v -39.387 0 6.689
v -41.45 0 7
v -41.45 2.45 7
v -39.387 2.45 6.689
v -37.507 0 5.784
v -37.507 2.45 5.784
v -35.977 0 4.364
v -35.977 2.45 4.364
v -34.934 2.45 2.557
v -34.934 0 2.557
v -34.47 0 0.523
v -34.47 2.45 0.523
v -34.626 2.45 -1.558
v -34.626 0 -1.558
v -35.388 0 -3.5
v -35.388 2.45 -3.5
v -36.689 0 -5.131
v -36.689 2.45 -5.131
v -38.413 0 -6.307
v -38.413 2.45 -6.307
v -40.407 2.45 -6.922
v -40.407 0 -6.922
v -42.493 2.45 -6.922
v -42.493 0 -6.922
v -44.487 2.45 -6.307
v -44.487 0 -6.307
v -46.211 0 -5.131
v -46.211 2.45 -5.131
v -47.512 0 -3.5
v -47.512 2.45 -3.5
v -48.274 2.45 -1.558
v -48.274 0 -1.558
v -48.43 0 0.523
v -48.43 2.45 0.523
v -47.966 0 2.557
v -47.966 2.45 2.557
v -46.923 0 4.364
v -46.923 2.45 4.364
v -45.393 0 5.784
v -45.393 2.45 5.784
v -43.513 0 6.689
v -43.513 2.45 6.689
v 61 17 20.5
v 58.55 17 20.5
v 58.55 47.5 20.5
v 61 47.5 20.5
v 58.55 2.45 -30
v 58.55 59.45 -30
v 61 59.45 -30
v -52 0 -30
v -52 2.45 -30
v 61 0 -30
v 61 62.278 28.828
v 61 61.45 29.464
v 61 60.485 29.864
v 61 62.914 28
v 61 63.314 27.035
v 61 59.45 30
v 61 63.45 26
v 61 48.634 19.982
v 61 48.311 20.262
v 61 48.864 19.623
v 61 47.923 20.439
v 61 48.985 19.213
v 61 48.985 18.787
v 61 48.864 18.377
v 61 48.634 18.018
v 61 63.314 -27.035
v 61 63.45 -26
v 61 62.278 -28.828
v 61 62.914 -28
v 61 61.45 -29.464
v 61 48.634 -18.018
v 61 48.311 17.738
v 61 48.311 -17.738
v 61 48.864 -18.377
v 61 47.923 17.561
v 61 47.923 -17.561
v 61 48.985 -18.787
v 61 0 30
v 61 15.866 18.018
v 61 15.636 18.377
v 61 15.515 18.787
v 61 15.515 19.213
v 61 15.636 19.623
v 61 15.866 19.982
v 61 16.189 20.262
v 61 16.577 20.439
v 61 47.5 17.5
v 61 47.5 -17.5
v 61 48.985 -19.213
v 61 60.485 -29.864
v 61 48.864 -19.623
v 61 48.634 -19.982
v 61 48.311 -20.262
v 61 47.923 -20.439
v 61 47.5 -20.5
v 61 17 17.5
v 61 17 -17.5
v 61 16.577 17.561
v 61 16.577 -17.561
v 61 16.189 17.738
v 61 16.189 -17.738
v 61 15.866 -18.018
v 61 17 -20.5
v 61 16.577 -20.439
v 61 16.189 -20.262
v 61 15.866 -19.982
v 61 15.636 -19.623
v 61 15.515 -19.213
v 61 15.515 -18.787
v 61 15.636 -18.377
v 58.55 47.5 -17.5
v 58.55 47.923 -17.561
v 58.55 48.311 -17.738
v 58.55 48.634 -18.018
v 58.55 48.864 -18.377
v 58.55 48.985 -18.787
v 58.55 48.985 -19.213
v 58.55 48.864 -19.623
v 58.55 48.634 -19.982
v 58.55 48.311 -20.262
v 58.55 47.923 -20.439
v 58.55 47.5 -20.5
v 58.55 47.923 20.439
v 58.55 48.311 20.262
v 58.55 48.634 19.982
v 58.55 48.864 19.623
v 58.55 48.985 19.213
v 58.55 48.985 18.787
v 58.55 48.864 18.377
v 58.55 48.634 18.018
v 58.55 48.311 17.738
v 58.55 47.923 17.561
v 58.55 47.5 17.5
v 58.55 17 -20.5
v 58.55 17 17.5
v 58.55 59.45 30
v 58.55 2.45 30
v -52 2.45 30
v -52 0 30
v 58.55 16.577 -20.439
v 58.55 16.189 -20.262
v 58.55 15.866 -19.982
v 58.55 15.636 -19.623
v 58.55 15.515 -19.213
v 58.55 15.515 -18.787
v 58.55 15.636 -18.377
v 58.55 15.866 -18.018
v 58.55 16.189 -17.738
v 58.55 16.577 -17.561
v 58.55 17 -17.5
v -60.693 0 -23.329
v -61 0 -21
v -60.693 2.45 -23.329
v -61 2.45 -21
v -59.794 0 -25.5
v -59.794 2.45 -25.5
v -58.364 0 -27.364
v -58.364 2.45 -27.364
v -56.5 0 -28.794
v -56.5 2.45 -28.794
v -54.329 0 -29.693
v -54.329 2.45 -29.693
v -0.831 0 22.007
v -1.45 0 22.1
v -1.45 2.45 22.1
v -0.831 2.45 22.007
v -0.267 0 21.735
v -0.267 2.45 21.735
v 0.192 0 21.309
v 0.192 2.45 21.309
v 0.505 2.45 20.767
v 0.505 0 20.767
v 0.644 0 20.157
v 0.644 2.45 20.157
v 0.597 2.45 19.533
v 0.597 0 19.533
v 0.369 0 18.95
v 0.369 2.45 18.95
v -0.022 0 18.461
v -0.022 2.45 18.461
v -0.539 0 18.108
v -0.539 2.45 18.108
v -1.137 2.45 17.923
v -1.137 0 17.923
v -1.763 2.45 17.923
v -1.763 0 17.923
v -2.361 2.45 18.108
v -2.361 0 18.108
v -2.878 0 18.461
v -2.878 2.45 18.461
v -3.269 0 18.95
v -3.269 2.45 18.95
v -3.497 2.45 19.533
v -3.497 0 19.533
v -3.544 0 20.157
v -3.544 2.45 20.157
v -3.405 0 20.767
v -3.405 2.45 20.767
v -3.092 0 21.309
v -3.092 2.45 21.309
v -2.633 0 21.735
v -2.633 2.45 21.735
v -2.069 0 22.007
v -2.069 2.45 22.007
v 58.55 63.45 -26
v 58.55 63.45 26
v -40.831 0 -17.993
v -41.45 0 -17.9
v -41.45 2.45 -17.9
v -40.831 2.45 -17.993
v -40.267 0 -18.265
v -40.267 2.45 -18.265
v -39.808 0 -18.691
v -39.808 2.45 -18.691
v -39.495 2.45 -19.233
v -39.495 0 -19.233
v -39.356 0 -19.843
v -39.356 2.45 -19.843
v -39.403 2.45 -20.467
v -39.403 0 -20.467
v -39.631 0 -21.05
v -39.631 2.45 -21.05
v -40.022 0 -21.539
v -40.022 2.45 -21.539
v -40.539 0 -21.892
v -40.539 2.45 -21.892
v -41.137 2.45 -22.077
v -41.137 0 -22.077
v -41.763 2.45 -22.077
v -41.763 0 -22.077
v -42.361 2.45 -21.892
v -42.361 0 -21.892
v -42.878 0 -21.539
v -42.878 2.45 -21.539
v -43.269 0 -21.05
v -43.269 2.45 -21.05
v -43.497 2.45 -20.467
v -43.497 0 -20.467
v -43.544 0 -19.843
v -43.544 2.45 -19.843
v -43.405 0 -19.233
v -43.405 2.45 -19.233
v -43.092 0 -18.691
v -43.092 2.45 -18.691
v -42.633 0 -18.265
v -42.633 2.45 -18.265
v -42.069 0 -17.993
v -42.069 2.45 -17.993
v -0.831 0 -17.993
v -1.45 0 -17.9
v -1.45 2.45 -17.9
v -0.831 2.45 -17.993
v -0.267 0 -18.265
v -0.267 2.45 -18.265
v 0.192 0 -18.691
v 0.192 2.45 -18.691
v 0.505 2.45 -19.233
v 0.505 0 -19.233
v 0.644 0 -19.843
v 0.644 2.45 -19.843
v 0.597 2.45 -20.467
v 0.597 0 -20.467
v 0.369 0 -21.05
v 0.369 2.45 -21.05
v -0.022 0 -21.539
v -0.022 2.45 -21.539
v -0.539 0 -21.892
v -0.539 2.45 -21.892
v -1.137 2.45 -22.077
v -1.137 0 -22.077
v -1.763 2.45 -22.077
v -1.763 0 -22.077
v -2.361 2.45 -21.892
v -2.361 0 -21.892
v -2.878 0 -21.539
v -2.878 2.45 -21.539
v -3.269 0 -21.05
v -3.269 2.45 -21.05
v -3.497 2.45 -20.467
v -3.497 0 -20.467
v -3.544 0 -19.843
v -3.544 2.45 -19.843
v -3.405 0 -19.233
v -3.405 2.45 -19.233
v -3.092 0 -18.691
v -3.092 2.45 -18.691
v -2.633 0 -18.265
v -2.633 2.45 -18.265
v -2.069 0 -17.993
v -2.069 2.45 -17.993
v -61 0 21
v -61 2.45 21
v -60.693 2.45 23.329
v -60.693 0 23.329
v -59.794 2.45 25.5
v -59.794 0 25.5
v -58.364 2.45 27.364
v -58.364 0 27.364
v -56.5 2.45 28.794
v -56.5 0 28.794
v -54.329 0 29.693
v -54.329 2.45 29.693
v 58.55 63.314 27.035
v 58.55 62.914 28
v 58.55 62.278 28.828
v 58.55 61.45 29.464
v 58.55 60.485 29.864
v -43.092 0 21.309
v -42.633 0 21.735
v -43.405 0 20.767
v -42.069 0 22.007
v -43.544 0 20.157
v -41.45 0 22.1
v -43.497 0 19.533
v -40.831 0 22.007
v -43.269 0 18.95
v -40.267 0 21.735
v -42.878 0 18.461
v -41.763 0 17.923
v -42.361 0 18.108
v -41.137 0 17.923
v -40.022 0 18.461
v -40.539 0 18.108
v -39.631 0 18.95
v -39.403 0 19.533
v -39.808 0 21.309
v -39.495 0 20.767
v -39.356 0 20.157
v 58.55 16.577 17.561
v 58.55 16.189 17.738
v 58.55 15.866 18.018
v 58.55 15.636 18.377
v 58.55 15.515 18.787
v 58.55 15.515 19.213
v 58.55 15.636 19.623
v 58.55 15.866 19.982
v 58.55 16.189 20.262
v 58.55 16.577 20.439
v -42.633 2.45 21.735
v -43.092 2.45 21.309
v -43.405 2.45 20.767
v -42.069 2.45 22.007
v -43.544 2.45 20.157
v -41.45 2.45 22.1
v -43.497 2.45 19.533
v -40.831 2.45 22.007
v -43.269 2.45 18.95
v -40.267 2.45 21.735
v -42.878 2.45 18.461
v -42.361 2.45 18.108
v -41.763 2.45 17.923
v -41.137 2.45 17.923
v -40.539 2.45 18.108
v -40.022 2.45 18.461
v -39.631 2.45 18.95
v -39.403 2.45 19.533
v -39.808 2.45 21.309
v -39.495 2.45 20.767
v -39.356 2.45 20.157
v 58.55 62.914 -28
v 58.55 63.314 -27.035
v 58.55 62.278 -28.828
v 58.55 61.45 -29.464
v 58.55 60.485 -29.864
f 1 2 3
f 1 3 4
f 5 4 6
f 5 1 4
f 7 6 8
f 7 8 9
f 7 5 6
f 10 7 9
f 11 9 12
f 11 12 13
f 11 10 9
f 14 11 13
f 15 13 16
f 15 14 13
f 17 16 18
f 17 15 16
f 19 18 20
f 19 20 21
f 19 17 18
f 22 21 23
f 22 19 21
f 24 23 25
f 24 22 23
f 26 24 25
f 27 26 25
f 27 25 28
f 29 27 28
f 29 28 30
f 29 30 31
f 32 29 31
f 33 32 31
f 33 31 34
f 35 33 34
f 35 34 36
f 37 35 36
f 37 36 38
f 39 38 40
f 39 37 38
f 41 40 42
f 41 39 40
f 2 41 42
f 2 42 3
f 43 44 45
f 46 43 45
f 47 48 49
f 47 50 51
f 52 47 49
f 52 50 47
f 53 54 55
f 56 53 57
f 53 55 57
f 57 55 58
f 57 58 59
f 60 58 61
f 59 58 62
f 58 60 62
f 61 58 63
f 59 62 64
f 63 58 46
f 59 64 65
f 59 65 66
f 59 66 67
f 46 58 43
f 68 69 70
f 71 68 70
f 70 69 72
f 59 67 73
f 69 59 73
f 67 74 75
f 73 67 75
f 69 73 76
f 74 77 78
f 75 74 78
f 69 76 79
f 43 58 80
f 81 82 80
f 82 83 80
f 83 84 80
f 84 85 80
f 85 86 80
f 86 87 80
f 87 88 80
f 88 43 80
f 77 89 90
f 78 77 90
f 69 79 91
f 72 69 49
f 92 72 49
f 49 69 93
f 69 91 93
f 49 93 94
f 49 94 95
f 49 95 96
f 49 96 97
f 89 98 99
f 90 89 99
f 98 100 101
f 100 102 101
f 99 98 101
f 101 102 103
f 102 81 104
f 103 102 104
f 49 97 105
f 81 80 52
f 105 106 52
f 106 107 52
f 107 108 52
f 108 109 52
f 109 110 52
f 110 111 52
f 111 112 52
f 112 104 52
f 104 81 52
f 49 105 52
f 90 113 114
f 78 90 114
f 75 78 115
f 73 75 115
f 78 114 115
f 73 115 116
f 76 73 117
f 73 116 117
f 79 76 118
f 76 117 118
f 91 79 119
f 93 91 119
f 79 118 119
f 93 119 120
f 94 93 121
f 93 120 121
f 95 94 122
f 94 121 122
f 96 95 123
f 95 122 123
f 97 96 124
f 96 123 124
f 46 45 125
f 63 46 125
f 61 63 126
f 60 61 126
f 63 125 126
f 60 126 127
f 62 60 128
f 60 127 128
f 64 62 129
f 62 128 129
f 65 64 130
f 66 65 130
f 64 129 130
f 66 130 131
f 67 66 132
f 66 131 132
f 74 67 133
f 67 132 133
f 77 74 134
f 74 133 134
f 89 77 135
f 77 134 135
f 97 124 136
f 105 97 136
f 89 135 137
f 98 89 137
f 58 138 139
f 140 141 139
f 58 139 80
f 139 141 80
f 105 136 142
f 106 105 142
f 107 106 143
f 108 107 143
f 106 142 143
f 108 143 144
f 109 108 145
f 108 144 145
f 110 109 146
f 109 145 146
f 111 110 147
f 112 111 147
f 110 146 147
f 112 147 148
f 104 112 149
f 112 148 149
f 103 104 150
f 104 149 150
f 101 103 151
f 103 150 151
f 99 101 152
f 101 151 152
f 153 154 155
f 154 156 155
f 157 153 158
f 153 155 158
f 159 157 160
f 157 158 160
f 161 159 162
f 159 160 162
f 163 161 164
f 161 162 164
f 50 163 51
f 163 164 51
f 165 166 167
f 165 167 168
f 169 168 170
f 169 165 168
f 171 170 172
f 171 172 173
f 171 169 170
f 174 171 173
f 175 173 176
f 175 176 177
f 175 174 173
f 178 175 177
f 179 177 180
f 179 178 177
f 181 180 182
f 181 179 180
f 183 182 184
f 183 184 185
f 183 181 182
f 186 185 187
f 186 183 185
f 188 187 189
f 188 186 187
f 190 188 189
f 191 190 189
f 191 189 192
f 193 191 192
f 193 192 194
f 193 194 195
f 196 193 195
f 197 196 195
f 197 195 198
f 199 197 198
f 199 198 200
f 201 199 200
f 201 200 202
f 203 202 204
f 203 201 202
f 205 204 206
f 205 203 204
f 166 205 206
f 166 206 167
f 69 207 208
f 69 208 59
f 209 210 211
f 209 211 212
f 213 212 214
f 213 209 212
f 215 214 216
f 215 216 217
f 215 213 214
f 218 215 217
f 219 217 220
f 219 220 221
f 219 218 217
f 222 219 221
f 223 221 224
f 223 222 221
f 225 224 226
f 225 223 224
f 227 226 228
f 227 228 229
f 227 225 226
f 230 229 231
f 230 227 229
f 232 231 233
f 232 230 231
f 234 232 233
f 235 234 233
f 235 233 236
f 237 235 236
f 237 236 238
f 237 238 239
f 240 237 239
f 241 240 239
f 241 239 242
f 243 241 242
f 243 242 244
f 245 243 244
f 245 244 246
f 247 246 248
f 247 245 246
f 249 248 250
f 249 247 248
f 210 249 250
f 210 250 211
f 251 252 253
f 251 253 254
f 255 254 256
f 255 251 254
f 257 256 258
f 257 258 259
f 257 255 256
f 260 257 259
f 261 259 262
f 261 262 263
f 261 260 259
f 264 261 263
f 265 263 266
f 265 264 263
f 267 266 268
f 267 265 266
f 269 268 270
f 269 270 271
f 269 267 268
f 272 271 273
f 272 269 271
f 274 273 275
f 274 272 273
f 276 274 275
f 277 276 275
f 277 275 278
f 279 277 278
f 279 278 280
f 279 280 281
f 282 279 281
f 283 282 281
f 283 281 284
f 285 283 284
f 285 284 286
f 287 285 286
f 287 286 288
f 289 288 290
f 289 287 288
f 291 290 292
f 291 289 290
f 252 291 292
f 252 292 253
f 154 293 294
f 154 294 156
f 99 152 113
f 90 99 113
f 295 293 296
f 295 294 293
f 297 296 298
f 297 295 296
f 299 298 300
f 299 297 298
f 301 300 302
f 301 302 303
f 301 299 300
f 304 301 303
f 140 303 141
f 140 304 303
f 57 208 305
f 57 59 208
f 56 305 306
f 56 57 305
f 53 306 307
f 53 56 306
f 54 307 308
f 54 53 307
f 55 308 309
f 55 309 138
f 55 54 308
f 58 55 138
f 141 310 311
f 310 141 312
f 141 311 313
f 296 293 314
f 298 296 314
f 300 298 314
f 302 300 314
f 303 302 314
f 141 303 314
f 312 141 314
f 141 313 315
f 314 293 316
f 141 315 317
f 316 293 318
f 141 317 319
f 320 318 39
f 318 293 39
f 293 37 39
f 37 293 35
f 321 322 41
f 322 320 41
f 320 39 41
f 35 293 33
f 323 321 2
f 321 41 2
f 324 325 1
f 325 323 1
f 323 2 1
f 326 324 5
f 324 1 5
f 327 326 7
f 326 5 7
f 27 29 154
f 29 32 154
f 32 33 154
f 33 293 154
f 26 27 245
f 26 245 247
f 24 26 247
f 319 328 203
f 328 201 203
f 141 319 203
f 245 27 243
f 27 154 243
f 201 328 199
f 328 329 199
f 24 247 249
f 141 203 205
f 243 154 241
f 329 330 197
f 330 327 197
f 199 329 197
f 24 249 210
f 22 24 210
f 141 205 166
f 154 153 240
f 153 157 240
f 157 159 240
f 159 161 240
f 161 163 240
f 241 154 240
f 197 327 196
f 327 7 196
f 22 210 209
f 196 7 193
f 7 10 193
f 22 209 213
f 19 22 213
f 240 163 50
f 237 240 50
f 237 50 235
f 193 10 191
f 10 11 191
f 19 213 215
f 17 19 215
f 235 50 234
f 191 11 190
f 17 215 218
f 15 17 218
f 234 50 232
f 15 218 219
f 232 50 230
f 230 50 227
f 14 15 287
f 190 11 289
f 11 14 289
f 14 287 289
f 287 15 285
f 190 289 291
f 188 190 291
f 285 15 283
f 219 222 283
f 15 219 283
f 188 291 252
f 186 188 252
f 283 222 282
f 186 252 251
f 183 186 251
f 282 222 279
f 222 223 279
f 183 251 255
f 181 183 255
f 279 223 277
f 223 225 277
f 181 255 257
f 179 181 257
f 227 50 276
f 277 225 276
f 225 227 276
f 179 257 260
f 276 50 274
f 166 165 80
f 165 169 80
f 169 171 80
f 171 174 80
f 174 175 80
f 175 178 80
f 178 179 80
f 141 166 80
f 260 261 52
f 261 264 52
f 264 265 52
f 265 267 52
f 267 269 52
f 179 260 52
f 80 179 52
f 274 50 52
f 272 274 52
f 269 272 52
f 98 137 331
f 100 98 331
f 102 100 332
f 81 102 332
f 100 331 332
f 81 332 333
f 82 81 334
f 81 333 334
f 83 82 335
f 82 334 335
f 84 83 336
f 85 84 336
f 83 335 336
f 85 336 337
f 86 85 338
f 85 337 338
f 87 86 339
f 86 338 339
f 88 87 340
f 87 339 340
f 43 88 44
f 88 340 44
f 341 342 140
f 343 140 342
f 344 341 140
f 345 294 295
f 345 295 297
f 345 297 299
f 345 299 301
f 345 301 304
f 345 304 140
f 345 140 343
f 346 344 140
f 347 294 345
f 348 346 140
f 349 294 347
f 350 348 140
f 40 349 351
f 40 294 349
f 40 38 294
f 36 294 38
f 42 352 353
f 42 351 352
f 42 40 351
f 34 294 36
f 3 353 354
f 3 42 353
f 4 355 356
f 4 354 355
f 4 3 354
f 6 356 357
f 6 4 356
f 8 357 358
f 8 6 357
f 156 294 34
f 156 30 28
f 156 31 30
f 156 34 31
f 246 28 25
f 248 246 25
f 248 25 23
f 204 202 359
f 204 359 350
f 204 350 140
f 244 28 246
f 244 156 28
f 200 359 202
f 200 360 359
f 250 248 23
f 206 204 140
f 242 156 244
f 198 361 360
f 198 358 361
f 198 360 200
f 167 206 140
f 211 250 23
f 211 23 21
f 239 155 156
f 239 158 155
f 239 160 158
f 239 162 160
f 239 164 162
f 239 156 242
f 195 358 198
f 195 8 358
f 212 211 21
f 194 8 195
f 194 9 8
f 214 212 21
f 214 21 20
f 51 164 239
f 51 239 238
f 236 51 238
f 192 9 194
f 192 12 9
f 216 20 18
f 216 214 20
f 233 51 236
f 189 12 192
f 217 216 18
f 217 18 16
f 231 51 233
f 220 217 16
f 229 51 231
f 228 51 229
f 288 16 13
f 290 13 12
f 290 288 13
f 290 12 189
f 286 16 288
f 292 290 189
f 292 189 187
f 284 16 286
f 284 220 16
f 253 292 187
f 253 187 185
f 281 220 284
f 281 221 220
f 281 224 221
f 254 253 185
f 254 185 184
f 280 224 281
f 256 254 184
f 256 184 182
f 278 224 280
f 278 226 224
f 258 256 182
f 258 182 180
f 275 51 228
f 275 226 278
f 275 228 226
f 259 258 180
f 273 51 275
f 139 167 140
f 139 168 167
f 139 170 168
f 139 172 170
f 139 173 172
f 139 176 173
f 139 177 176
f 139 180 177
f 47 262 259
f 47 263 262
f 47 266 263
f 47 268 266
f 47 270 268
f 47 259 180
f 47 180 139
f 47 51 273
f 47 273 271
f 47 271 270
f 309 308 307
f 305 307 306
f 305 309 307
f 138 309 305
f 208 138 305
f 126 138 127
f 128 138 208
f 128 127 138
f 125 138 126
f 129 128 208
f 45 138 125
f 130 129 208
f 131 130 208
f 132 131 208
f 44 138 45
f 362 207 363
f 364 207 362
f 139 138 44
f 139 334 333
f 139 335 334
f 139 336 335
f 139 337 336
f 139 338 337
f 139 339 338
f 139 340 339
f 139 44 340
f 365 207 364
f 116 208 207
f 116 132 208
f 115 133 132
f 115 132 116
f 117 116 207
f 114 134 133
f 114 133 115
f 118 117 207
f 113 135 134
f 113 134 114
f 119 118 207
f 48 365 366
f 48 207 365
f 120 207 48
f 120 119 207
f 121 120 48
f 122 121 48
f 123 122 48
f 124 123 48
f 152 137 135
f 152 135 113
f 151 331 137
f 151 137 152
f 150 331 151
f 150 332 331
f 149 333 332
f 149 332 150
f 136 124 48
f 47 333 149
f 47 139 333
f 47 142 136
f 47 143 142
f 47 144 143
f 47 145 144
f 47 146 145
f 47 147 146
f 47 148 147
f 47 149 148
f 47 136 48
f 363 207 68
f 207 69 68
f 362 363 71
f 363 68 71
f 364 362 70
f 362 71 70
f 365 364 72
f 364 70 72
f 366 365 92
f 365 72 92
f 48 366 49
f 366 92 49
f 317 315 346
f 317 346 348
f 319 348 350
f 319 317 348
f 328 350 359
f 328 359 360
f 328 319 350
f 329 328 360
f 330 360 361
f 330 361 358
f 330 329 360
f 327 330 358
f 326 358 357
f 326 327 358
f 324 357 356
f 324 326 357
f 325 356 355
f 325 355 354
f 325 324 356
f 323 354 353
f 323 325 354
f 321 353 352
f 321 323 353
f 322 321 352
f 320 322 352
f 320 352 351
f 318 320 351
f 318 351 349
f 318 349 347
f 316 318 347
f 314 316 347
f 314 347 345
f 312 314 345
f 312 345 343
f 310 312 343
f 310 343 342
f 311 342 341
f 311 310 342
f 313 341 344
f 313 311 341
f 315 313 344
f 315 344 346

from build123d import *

# Parameters (mm, degrees)
SKETCH_1_W          = 122
SKETCH_1_H          = 60
SKETCH_1_R          = 7
SKETCH_1_R_2        = 2.1
EXTRUDE_1_DEPTH     = 2.45
FILLET_1_R          = 9
SKETCH_2_W          = 2.45
SKETCH_2_H          = 60
EXTRUDE_2_DEPTH     = 61
FILLET_2_R          = 4
CUT_EXTRUDE_1_DEPTH = 61


with BuildPart() as part:
    # 草图1 → 凸台-拉伸1 (new body)
    with BuildSketch(Plane(origin=(0, 0, 0), x_dir=(1, 0, 0), z_dir=(0, 1, 0))):
        Rectangle(SKETCH_1_W, SKETCH_1_H)
        with Locations(Location((-41.45, 0, 0), (0, 0, 270))):
            Circle(SKETCH_1_R, mode=Mode.SUBTRACT)
        with Locations(Location((-41.45, 20, 0), (0, 0, 270))):
            Circle(SKETCH_1_R_2, mode=Mode.SUBTRACT)
        with Locations(Location((-1.45, 20, 0), (0, 0, 270))):
            Circle(SKETCH_1_R_2, mode=Mode.SUBTRACT)
        with Locations(Location((-1.45, -20, 0), (0, 0, 270))):
            Circle(SKETCH_1_R_2, mode=Mode.SUBTRACT)
        with Locations(Location((-41.45, -20, 0), (0, 0, 270))):
            Circle(SKETCH_1_R_2, mode=Mode.SUBTRACT)
    extrude(amount=EXTRUDE_1_DEPTH)

    # 圆角1
    fillet_1_edges = [part.edges().sort_by_distance(p)[0] for p in [
        (-61, 1.225, -30),
        (-61, 1.225, 30),
    ]]
    fillet(fillet_1_edges, radius=FILLET_1_R)

    # 草图2 → 凸台-拉伸2 (add)
    with BuildSketch(Plane(origin=(0, 2.45, 0), x_dir=(1, 0, 0), z_dir=(0, 1, 0))):
        with Locations((59.775, 0)):
            Rectangle(SKETCH_2_W, SKETCH_2_H)
    extrude(amount=EXTRUDE_2_DEPTH)

    # 圆角2
    fillet_2_edges = [part.edges().sort_by_distance(p)[0] for p in [
        (59.775, 63.45, -30),
        (59.775, 63.45, 30),
    ]]
    fillet(fillet_2_edges, radius=FILLET_2_R)

    # 草图3 → 切除-拉伸1 (cut)
    with BuildSketch(Plane.ZY.offset(-58.55)):
        with BuildLine():
            Line((-20.5, 47.5), (-20.5, 17))
            ThreePointArc((-20.5, 17), (-19, 15.5), (-17.5, 17))
            Line((-17.5, 17), (-17.5, 47.5))
            ThreePointArc((-17.5, 47.5), (-19, 49), (-20.5, 47.5))
        make_face()
        with BuildLine():
            Line((17.5, 47.5), (17.5, 17))
            ThreePointArc((17.5, 17), (19, 15.5), (20.5, 17))
            Line((20.5, 17), (20.5, 47.5))
            ThreePointArc((20.5, 47.5), (19, 49), (17.5, 47.5))
        make_face()
    extrude(amount=-CUT_EXTRUDE_1_DEPTH, mode=Mode.SUBTRACT)


solid = part.part
